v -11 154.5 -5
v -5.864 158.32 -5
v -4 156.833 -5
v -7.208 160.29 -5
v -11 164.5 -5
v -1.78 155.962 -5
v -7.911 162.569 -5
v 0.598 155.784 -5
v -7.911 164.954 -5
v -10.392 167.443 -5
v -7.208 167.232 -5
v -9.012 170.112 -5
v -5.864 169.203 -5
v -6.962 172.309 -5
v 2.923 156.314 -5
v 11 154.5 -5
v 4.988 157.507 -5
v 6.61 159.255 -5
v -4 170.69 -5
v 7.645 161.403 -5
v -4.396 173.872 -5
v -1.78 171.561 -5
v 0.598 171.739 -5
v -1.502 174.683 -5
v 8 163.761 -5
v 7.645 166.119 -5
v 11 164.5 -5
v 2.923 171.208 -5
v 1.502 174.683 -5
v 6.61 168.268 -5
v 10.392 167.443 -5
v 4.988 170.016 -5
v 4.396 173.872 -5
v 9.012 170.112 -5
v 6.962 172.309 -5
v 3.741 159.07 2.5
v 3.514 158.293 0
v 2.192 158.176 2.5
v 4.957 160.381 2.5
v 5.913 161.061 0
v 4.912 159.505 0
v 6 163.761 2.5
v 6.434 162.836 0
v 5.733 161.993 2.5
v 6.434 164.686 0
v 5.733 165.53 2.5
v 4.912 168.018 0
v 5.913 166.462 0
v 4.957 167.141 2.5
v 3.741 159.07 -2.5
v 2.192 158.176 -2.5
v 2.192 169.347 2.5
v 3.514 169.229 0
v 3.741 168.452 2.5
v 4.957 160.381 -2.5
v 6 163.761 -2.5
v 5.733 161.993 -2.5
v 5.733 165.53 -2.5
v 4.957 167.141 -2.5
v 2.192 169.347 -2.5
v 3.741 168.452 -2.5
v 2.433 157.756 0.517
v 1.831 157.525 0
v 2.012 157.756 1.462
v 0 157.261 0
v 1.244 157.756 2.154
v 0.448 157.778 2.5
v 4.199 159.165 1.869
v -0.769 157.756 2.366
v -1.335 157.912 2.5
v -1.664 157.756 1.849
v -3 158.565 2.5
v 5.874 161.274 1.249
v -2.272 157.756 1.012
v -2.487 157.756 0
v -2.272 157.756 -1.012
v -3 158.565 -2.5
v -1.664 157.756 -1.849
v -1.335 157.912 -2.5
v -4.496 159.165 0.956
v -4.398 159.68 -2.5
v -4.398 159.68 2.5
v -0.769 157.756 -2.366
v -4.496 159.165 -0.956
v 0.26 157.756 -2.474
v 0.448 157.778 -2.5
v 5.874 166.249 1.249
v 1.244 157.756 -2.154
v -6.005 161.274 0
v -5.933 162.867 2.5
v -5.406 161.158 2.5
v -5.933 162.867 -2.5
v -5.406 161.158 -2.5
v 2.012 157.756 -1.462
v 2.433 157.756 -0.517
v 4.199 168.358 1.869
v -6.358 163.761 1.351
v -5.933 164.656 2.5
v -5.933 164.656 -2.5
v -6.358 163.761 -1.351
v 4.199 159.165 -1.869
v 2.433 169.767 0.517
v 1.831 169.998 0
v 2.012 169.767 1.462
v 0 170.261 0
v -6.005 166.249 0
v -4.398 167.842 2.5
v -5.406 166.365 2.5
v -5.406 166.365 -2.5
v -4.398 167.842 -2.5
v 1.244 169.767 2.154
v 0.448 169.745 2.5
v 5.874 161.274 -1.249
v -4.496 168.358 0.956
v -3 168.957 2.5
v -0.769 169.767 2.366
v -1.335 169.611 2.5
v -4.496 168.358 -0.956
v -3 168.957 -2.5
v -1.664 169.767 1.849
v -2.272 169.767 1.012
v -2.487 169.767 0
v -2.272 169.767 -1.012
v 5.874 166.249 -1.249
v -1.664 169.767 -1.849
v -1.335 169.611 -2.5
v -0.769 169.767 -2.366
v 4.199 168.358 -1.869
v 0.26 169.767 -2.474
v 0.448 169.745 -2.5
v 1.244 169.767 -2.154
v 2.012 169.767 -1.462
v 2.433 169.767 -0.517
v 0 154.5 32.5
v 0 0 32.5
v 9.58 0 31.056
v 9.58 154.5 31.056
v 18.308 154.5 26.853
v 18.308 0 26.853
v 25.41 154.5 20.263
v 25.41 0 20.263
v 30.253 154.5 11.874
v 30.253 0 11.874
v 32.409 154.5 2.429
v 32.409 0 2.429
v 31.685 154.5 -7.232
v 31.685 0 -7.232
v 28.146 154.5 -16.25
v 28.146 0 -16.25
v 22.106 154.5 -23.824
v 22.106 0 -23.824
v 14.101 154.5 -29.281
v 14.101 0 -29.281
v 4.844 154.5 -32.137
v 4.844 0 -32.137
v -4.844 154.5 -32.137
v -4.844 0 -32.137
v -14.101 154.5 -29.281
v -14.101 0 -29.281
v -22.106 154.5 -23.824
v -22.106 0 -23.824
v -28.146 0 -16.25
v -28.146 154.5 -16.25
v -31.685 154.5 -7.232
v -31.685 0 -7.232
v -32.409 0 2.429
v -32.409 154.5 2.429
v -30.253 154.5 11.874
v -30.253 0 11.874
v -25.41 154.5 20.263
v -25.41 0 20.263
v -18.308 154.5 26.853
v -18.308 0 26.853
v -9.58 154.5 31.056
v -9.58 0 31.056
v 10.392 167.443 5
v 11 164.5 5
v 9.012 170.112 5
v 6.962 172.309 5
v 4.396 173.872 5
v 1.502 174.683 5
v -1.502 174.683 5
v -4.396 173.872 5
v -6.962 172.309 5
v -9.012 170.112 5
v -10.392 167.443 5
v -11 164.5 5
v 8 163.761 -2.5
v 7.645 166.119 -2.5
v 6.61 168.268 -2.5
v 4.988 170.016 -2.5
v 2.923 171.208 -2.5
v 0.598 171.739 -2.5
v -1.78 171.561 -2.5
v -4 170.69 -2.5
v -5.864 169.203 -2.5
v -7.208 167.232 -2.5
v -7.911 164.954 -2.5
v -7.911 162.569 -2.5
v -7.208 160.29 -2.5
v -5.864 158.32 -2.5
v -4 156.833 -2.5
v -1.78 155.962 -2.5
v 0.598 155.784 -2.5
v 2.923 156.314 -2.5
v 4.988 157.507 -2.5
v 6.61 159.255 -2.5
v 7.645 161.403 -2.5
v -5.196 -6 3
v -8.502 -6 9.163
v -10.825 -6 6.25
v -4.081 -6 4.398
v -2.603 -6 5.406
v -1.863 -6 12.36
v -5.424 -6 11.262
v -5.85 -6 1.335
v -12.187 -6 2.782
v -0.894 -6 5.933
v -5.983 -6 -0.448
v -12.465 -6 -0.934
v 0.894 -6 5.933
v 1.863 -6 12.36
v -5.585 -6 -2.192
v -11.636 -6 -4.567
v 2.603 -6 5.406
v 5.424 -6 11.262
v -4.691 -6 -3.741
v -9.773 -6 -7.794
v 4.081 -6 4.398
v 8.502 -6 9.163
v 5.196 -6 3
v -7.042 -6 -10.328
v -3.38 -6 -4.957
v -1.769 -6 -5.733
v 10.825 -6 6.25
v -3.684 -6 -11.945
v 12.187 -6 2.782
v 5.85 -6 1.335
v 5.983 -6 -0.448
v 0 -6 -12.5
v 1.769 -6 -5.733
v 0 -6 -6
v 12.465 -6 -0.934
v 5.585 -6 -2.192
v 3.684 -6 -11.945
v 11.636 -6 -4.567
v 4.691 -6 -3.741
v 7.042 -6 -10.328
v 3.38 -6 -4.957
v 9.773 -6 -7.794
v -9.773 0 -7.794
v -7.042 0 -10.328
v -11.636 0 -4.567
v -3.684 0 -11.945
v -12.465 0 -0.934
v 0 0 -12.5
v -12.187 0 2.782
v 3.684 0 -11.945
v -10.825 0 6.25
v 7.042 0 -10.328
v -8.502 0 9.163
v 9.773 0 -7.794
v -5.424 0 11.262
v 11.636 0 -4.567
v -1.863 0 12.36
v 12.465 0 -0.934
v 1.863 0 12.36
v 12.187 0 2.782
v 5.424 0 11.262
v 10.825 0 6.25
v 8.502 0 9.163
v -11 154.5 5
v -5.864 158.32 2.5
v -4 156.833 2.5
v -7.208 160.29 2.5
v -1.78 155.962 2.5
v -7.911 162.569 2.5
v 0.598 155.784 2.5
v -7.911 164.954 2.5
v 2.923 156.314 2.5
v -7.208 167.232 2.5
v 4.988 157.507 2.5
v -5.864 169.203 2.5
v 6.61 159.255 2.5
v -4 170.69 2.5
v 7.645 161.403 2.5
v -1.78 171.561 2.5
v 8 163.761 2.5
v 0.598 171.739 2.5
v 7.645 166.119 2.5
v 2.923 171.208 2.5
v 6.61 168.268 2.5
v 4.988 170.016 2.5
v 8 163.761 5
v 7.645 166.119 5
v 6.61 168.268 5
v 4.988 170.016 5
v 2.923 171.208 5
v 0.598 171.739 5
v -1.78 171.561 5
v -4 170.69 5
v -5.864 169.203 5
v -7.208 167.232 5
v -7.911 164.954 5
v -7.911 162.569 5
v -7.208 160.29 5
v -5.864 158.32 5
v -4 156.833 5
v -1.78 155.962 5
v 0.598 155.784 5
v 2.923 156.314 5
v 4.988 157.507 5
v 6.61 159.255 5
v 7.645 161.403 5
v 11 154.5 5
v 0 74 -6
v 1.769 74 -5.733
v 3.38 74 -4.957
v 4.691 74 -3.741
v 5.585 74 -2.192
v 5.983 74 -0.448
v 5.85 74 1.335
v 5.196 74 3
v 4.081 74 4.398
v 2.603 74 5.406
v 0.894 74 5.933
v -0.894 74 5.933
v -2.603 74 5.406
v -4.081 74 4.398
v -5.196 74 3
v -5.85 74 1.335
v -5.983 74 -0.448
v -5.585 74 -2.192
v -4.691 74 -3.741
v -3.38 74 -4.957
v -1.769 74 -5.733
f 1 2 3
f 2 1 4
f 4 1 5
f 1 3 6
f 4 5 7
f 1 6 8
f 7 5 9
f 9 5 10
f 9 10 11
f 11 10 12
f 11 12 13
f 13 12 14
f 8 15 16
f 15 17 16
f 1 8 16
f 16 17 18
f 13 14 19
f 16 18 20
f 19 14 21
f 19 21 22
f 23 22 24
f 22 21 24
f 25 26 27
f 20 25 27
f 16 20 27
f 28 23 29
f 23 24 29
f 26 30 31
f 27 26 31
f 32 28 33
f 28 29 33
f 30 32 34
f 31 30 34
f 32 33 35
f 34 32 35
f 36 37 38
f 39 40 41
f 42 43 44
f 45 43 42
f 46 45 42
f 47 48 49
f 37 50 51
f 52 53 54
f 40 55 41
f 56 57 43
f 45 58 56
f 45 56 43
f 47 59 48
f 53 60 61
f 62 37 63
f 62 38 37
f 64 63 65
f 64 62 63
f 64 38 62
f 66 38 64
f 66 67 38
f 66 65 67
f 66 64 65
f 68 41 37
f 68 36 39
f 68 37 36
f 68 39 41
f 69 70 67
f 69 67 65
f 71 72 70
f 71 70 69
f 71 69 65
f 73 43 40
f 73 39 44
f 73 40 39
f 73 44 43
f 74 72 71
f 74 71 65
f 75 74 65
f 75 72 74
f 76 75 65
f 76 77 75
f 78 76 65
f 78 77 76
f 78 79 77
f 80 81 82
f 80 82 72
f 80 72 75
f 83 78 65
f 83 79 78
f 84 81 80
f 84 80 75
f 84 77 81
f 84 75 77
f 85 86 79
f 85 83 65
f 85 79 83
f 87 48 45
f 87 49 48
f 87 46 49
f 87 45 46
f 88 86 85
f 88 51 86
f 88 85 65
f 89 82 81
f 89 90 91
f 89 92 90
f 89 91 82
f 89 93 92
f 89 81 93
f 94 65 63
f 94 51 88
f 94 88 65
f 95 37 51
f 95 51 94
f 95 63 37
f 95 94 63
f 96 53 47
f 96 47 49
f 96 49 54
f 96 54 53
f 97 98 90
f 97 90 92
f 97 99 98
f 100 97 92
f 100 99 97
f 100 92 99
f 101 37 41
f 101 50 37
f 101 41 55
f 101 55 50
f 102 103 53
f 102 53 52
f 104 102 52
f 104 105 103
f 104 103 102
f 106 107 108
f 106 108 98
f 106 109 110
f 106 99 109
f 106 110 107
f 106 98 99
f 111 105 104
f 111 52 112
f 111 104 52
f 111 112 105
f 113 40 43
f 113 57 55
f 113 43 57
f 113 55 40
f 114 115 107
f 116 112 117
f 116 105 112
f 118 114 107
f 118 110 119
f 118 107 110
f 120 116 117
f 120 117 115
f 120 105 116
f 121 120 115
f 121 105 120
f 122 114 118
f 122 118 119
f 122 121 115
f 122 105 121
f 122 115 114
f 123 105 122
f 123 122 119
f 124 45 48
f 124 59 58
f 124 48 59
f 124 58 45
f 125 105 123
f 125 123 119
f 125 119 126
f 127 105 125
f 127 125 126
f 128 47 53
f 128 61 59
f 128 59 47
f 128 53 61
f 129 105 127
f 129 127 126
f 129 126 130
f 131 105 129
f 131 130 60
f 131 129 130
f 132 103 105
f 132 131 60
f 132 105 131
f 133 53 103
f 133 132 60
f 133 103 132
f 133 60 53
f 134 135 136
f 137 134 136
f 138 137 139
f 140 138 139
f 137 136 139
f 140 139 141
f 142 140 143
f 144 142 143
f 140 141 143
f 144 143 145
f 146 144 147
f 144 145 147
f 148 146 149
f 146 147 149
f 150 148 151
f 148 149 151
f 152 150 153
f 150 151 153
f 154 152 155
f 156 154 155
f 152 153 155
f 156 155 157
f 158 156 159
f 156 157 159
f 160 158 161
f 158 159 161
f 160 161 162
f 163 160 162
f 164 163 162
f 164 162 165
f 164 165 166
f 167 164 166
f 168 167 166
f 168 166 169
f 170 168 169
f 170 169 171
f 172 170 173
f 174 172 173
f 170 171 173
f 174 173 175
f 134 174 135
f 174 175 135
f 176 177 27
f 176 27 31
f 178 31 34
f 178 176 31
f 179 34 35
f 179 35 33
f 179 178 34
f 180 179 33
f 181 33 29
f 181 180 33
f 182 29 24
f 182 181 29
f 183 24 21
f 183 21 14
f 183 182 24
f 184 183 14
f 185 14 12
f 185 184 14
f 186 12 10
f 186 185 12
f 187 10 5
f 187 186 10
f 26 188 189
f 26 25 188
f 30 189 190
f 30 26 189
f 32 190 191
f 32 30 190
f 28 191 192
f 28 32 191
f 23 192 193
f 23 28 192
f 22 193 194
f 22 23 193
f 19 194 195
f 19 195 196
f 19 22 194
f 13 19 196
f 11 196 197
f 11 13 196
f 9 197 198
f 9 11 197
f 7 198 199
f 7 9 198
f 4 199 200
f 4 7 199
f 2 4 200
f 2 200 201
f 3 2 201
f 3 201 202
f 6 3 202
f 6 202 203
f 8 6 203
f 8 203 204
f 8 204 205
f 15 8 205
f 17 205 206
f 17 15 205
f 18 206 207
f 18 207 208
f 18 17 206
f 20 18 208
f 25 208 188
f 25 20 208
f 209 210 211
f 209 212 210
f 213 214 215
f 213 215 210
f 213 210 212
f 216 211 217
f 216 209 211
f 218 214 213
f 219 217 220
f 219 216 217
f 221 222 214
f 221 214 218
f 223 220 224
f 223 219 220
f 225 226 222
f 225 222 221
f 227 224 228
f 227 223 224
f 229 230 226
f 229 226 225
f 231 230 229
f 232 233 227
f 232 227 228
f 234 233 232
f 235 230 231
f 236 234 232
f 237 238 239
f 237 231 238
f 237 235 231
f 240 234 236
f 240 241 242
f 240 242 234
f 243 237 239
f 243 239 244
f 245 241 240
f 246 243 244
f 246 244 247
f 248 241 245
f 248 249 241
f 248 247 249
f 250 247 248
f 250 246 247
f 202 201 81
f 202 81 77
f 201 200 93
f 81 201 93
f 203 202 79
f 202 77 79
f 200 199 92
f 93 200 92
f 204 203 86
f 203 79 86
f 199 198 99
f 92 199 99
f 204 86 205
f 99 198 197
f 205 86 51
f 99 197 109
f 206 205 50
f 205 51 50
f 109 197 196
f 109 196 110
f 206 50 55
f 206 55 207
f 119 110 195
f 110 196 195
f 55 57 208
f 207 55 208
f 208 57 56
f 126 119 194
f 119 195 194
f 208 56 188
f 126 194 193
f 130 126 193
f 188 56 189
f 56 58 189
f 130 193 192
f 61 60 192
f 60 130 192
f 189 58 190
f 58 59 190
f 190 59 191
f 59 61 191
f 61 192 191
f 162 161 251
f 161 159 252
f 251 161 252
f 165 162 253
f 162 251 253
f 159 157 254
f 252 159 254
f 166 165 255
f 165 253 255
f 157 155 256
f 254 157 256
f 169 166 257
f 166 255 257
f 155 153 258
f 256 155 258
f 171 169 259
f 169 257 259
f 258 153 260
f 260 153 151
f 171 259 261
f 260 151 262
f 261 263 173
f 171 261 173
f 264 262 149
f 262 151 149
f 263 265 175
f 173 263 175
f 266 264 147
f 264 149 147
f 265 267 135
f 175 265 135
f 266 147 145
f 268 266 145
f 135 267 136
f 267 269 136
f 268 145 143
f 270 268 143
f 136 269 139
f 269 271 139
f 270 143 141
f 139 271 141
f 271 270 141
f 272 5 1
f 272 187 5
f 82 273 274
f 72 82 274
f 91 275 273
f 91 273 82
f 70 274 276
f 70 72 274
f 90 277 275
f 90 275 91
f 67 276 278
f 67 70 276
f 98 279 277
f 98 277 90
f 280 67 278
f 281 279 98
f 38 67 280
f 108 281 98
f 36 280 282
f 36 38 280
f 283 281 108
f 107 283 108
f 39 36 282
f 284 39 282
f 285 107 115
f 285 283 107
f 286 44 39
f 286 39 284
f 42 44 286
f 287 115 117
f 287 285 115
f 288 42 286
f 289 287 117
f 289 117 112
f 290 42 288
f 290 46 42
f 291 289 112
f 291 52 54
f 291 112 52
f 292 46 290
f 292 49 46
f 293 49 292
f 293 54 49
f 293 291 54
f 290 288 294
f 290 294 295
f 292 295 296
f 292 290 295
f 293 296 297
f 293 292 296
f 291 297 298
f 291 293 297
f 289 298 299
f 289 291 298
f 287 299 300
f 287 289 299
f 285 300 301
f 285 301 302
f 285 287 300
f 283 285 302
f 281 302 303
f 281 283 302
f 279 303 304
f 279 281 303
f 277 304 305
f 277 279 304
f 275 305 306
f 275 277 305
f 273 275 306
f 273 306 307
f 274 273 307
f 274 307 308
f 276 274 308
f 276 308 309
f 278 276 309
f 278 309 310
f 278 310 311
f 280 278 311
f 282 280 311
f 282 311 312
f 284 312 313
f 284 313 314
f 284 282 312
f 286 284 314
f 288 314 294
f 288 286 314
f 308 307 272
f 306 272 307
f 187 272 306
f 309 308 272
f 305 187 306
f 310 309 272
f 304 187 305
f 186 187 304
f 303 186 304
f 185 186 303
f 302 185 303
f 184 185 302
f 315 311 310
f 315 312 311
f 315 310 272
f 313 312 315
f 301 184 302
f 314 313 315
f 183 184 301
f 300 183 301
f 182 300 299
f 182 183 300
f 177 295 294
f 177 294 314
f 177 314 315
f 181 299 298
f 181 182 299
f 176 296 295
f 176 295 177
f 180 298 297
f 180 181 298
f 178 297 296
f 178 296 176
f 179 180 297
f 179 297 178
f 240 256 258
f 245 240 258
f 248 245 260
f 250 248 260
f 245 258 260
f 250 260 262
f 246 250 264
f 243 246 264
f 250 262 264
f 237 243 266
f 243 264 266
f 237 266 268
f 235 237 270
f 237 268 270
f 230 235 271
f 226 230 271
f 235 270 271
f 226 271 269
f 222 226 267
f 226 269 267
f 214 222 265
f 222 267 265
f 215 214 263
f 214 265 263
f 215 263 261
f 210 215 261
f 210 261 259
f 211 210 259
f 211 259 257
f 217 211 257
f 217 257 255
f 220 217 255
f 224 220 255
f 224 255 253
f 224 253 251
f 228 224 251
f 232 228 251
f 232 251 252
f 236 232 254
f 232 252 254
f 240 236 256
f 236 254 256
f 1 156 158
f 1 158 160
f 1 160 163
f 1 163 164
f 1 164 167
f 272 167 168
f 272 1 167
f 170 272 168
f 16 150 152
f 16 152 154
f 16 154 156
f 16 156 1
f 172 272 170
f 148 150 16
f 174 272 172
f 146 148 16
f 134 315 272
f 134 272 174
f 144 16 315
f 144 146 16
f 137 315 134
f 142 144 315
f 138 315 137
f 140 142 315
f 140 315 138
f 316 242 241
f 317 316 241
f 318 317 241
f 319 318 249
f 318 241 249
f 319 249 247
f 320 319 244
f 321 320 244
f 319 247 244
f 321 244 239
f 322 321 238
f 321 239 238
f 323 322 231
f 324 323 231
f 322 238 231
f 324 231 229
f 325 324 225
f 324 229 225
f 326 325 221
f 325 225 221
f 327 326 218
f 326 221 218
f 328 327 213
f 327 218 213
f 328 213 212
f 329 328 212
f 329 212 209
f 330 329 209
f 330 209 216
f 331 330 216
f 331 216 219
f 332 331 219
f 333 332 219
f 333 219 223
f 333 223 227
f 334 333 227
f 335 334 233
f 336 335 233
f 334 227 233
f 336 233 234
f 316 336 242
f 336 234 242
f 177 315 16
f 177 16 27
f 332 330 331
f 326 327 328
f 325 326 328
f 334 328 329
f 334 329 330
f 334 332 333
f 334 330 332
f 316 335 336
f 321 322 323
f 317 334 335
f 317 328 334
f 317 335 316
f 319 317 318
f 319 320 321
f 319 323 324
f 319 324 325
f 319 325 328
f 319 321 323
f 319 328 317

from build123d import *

# Parameters (mm, degrees)
SKETCH_1_R          = 32.5
EXTRUDE_1_DEPTH     = 154.5
SKETCH_2_R          = 12.5
EXTRUDE_2_DEPTH     = 6
SKETCH_3_R          = 6
CUT_EXTRUDE_1_DEPTH = 80
SKETCH_4_R          = 8
EXTRUDE_3_DEPTH     = 5
SKETCH_5_R          = 8
EXTRUDE_4_DEPTH     = 2.5
SKETCH_8_R          = 4
SKETCH_7_R          = 6
SKETCH_9_R          = 2.5
CUT_EXTRUDE_2_DEPTH = 31
SKETCH_10_R         = 6
CUT_EXTRUDE_3_DEPTH = 17


with BuildPart() as part:
    # 草图1 → 凸台-拉伸1 (new body)
    with BuildSketch(Plane(origin=(0, 0, 0), x_dir=(1, 0, 0), z_dir=(0, 1, 0))):
        with Locations(Location((0, 0, 0), (0, 0, 270))):
            Circle(SKETCH_1_R)
    extrude(amount=EXTRUDE_1_DEPTH)

    # 草图2 → 凸台-拉伸2 (add)
    with BuildSketch(Plane.XZ):
        with Locations(Location((0, 0, 0), (0, 0, 270))):
            Circle(SKETCH_2_R)
    extrude(amount=EXTRUDE_2_DEPTH)

    # 草图3 → 切除-拉伸1 (cut)
    with BuildSketch(Plane.XZ.offset(6)):
        with Locations(Location((0, 0, 0), (0, 0, 270))):
            Circle(SKETCH_3_R)
    extrude(amount=-CUT_EXTRUDE_1_DEPTH, mode=Mode.SUBTRACT)

    # 草图4 → 凸台-拉伸3 (add, symmetric)
    with BuildSketch(Plane.XY):
        with BuildLine():
            Line((-11, 154.5), (11, 154.5))
            Line((11, 154.5), (11, 164.5))
            ThreePointArc((11, 164.5), (0, 174.786108986), (-11, 164.5))
            Line((-11, 164.5), (-11, 154.5))
        make_face()
        with Locations((0, 163.761335751)):
            Circle(SKETCH_4_R, mode=Mode.SUBTRACT)
    extrude(amount=EXTRUDE_3_DEPTH, both=True)

    # 草图5 → 凸台-拉伸4 (add, symmetric)
    with BuildSketch(Plane.XY):
        with Locations((0, 163.761335751)):
            Circle(SKETCH_5_R)
    extrude(amount=EXTRUDE_4_DEPTH, both=True)

    # 草图8 → 放样1 section 0
    with BuildSketch(Plane.XY.offset(4.5)):
        with Locations((0, 163.761335751)):
            Circle(SKETCH_8_R)
    # 草图7 → 放样1 section 1
    with BuildSketch(Plane.XY.offset(2.5)):
        with Locations((0, 163.761335751)):
            Circle(SKETCH_7_R)
    loft_1 = loft()

    # 镜向1: 放样1 across plane
    add(loft_1.mirror(Plane.XY))

    # 草图9 → 切除-拉伸2 (cut)
    with BuildSketch(Plane.XY.offset(4.5)):
        with Locations(Location((0, 166.761335751, 0), (0, 0, 2.865983983))):
            Circle(SKETCH_9_R)
    extrude(amount=-CUT_EXTRUDE_2_DEPTH, mode=Mode.SUBTRACT)

    # 草图10 → 切除-拉伸3 (cut)
    with BuildSketch(Plane.XY.offset(4.5)):
        with Locations((0, 163.761335751)):
            Circle(SKETCH_10_R)
    extrude(amount=-CUT_EXTRUDE_3_DEPTH, mode=Mode.SUBTRACT)

    # 草图11 → 切除-旋转1 (revolve, cut)
    with BuildSketch(Plane.XY):
        with BuildLine():
            Line((0, 170.261335751), (0, 157.261335751))
            ThreePointArc((0, 157.261335751), (6.5, 163.761335751), (0, 170.261335751))
        make_face()
    revolve(axis=Axis((0, 170.261335751, 0), (0, -1, 0)), mode=Mode.SUBTRACT)


solid = part.part
